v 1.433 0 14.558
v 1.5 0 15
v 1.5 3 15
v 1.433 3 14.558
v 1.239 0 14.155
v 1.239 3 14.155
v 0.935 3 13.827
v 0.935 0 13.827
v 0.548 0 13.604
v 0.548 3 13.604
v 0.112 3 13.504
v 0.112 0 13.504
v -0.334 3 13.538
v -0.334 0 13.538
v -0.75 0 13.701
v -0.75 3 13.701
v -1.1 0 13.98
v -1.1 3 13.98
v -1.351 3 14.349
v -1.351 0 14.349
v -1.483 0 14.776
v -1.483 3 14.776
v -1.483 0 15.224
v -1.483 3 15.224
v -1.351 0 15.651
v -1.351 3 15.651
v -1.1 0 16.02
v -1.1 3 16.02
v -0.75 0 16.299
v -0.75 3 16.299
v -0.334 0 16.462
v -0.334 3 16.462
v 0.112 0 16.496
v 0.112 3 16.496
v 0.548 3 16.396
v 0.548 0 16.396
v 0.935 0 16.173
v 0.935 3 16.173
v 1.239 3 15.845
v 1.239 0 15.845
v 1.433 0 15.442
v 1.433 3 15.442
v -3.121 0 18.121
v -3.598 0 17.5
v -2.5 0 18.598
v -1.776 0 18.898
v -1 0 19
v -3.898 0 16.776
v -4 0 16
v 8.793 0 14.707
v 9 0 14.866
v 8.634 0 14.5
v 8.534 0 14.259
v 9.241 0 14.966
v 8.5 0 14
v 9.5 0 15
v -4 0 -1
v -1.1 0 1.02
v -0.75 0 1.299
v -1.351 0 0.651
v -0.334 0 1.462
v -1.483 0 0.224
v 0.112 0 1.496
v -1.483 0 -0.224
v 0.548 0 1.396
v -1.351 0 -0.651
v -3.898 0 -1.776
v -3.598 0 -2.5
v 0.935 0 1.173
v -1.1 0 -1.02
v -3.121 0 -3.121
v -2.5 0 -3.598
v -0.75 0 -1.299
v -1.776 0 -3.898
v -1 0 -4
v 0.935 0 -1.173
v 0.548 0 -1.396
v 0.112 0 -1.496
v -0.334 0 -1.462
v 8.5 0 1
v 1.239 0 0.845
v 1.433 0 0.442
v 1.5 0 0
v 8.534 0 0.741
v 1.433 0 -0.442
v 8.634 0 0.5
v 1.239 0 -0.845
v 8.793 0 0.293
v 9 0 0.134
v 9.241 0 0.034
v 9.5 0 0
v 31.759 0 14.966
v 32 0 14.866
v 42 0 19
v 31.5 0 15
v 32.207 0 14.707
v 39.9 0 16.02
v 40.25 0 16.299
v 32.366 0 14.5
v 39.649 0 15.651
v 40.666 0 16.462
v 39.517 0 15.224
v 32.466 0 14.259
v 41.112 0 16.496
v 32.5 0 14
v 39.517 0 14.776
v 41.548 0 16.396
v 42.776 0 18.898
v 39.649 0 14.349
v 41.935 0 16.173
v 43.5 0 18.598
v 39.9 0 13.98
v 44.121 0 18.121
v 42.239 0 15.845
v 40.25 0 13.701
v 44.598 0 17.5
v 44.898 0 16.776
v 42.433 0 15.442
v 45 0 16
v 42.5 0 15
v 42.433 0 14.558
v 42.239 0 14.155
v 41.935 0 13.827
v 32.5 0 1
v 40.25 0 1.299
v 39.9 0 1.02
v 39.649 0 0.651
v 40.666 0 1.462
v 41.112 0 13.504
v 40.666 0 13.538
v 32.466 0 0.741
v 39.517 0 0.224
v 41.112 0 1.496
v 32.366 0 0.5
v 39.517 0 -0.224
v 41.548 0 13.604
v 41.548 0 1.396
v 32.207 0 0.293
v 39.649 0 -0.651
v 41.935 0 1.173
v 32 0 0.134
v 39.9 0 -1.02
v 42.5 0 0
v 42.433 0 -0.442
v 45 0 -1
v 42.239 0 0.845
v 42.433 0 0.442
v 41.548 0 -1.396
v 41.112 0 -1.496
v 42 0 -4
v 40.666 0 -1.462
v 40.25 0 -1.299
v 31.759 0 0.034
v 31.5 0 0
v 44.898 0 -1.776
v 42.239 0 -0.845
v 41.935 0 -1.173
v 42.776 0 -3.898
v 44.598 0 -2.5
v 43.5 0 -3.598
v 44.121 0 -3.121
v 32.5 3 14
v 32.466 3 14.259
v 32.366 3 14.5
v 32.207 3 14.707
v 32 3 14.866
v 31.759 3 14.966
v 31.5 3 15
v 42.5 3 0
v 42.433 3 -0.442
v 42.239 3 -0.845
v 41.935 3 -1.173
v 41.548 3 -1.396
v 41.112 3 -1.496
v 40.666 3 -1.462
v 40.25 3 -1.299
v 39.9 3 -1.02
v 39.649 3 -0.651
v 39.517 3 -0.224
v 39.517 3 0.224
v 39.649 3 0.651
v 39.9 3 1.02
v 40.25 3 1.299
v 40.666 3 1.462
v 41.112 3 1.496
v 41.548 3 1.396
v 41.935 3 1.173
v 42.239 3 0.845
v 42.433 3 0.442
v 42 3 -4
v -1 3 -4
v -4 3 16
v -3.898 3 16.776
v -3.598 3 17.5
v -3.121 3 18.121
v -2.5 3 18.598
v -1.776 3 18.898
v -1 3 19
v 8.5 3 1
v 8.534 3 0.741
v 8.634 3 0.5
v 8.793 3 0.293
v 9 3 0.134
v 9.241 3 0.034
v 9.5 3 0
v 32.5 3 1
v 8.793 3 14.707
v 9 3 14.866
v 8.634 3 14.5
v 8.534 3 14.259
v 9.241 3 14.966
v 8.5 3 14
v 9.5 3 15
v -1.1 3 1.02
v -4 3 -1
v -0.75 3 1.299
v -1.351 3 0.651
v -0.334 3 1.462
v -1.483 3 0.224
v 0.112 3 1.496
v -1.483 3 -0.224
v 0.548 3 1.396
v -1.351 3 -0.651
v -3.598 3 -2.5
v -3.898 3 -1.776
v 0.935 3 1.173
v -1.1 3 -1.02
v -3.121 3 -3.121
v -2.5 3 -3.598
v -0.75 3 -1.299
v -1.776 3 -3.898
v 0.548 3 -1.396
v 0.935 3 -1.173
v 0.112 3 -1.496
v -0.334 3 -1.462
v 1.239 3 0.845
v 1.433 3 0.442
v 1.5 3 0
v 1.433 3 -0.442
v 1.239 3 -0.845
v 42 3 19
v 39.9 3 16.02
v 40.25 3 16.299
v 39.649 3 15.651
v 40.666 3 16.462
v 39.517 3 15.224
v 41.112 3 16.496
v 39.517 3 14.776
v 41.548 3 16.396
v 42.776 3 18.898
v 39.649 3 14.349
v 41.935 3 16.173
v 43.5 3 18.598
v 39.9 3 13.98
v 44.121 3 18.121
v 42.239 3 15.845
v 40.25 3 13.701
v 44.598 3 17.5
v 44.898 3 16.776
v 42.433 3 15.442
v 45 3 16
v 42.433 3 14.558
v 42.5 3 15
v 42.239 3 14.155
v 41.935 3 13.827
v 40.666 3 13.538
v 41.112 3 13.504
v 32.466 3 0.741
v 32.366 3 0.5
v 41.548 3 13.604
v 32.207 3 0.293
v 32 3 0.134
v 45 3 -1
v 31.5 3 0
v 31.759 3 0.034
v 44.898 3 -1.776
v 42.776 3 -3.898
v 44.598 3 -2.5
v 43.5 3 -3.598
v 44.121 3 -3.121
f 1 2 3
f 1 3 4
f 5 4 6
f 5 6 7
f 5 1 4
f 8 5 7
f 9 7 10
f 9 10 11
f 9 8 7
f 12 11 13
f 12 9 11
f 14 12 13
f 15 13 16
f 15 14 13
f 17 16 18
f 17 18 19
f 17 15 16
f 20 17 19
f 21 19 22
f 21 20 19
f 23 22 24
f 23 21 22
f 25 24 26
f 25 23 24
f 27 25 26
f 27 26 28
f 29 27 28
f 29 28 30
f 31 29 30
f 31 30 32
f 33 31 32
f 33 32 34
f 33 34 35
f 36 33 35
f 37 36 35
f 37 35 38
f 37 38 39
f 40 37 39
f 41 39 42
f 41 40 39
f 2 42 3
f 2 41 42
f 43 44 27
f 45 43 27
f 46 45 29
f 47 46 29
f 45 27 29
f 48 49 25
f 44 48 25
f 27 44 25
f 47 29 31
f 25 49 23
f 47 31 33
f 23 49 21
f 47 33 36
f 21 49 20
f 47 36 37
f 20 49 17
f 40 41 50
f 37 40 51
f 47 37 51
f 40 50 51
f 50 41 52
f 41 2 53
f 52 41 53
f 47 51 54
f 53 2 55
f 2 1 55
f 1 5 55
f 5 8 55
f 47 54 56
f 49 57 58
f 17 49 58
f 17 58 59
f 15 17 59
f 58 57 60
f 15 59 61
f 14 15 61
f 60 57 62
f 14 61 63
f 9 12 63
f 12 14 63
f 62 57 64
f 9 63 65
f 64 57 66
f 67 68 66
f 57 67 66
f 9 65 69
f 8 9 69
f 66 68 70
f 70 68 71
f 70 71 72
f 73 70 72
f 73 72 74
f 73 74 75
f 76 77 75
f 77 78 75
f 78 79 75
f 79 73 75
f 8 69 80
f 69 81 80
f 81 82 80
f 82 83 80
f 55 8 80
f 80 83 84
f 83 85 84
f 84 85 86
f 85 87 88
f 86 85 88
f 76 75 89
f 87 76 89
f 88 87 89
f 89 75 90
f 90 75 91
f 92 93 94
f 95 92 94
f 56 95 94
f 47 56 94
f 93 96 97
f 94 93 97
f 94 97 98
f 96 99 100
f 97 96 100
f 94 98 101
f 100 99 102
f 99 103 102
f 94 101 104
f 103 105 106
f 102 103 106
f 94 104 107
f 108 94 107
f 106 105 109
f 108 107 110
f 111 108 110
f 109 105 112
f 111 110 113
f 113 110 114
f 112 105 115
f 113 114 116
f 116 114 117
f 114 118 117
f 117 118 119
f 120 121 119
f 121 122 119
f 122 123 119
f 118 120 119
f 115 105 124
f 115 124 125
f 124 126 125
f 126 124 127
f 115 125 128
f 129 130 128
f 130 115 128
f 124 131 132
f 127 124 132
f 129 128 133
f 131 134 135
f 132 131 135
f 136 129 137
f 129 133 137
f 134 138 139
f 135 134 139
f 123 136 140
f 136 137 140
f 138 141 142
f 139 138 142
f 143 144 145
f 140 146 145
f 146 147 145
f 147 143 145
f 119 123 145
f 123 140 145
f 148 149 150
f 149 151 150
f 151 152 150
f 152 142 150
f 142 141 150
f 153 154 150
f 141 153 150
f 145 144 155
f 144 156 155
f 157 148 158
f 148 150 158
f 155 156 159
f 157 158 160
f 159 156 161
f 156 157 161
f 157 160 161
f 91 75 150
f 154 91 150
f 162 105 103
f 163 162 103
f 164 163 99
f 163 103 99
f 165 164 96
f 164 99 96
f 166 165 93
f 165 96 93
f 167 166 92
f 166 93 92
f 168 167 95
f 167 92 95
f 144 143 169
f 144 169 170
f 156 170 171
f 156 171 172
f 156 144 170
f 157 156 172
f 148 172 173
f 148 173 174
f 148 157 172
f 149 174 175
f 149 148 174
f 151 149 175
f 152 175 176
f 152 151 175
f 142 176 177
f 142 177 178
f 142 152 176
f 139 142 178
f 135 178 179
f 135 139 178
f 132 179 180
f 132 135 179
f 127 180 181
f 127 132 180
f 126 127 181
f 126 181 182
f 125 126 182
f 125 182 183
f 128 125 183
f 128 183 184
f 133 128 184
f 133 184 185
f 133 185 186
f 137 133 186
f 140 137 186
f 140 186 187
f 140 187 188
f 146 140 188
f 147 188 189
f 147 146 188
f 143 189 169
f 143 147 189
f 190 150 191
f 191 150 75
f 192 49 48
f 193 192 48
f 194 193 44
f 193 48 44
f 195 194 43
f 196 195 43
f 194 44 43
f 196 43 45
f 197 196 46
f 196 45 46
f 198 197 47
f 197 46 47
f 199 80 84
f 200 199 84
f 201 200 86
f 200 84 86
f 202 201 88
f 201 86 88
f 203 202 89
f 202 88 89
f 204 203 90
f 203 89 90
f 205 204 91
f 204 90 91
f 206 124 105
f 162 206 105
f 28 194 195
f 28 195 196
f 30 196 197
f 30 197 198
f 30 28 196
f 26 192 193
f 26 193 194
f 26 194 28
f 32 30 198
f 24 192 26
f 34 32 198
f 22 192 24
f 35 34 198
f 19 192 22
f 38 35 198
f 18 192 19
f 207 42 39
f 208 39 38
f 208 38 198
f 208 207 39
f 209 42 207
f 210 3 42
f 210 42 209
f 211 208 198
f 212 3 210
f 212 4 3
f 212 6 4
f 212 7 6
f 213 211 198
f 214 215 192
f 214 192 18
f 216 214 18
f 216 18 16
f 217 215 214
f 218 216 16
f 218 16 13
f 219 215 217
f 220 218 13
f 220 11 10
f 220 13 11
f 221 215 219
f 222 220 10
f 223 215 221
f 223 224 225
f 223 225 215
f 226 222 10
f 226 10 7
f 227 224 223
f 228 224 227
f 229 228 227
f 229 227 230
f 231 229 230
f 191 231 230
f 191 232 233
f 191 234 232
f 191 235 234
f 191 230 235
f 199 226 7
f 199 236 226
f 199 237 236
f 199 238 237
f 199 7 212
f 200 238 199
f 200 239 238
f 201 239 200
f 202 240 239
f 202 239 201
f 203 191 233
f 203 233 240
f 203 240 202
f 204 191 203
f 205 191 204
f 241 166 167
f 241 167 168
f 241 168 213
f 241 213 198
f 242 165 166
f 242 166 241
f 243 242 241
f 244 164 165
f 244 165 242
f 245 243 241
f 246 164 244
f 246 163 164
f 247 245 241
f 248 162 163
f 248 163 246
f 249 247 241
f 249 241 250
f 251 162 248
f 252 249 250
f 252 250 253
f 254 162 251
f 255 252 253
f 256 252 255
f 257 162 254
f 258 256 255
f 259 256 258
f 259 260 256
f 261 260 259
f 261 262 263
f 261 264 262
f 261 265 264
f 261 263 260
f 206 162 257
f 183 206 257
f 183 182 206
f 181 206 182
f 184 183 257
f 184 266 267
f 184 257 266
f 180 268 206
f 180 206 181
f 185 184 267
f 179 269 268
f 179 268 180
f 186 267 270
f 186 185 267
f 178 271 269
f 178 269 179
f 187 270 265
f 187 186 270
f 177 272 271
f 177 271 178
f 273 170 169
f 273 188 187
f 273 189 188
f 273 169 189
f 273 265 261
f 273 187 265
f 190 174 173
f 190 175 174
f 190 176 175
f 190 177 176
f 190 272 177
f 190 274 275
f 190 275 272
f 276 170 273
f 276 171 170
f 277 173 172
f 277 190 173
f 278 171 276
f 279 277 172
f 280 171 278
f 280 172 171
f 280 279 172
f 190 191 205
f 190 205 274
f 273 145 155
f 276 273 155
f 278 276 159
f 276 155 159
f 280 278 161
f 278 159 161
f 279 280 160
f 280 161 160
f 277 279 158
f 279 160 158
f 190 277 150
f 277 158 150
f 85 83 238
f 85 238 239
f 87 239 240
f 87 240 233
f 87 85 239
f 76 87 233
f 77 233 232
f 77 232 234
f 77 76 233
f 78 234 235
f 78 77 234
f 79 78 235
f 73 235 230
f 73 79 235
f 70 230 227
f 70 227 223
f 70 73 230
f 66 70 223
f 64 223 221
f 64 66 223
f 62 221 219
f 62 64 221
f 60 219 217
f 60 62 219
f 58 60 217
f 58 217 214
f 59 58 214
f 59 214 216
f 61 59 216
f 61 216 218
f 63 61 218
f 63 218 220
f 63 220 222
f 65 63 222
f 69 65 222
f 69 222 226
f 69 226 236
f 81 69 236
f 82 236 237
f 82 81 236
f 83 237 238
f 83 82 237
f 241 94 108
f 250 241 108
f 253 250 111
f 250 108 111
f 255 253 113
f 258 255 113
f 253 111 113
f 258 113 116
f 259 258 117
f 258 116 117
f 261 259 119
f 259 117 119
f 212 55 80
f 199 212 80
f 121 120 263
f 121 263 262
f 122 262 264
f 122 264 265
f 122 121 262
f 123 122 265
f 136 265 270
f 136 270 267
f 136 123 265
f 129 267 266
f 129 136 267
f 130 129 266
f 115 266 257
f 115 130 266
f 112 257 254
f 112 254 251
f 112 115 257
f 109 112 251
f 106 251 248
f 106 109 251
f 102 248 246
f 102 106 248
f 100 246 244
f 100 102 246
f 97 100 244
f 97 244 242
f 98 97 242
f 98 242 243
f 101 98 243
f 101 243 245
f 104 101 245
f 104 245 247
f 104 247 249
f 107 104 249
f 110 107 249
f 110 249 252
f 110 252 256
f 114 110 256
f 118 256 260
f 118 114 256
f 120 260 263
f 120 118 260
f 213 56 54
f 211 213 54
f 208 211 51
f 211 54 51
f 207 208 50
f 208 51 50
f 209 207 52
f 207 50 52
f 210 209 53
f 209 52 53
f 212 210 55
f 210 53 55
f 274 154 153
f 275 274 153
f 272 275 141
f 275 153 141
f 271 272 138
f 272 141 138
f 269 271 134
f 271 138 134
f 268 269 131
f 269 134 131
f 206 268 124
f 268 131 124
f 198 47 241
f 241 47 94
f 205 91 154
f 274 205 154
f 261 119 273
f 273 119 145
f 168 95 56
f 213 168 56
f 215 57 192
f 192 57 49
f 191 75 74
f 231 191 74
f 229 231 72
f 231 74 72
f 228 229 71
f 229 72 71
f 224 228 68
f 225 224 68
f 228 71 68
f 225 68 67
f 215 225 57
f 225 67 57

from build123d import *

# Parameters (mm, degrees)
SKETCH1_R           = 1.5
BOSS_EXTRUDE1_DEPTH = 3


with BuildPart() as part:
    # Sketch1 → Boss-Extrude1 (new body)
    with BuildSketch(Plane(origin=(0, 0, 0), x_dir=(1, 0, 0), z_dir=(0, 1, 0))):
        with BuildLine():
            Line((-4, 1), (-4, -16))
            ThreePointArc((-4, -16), (-3.121320344, -18.121320344), (-1, -19))
            Line((-1, -19), (42, -19))
            ThreePointArc((42, -19), (44.121320344, -18.121320344), (45, -16))
            Line((45, -16), (45, 1))
            ThreePointArc((45, 1), (44.121320344, 3.121320344), (42, 4))
            Line((42, 4), (-1, 4))
            ThreePointArc((-1, 4), (-3.121320344, 3.121320344), (-4, 1))
        make_face()
        Circle(SKETCH1_R, mode=Mode.SUBTRACT)
        with Locations((41, 0)):
            Circle(SKETCH1_R, mode=Mode.SUBTRACT)
        with Locations((41, -15)):
            Circle(SKETCH1_R, mode=Mode.SUBTRACT)
        with Locations((0, -15)):
            Circle(SKETCH1_R, mode=Mode.SUBTRACT)
        with BuildLine():
            Line((9.5, 0), (31.5, 0))
            ThreePointArc((31.5, 0), (32.207106781, -0.292893219), (32.5, -1))
            Line((32.5, -1), (32.5, -14))
            ThreePointArc((32.5, -14), (32.207106781, -14.707106781), (31.5, -15))
            Line((31.5, -15), (15.880823308, -15))
            Line((15.880823308, -15), (9.5, -15))
            ThreePointArc((9.5, -15), (8.792893219, -14.707106781), (8.5, -14))
            Line((8.5, -14), (8.5, -1))
            ThreePointArc((8.5, -1), (8.792893219, -0.292893219), (9.5, 0))
        make_face(mode=Mode.SUBTRACT)
    extrude(amount=BOSS_EXTRUDE1_DEPTH)


solid = part.part
